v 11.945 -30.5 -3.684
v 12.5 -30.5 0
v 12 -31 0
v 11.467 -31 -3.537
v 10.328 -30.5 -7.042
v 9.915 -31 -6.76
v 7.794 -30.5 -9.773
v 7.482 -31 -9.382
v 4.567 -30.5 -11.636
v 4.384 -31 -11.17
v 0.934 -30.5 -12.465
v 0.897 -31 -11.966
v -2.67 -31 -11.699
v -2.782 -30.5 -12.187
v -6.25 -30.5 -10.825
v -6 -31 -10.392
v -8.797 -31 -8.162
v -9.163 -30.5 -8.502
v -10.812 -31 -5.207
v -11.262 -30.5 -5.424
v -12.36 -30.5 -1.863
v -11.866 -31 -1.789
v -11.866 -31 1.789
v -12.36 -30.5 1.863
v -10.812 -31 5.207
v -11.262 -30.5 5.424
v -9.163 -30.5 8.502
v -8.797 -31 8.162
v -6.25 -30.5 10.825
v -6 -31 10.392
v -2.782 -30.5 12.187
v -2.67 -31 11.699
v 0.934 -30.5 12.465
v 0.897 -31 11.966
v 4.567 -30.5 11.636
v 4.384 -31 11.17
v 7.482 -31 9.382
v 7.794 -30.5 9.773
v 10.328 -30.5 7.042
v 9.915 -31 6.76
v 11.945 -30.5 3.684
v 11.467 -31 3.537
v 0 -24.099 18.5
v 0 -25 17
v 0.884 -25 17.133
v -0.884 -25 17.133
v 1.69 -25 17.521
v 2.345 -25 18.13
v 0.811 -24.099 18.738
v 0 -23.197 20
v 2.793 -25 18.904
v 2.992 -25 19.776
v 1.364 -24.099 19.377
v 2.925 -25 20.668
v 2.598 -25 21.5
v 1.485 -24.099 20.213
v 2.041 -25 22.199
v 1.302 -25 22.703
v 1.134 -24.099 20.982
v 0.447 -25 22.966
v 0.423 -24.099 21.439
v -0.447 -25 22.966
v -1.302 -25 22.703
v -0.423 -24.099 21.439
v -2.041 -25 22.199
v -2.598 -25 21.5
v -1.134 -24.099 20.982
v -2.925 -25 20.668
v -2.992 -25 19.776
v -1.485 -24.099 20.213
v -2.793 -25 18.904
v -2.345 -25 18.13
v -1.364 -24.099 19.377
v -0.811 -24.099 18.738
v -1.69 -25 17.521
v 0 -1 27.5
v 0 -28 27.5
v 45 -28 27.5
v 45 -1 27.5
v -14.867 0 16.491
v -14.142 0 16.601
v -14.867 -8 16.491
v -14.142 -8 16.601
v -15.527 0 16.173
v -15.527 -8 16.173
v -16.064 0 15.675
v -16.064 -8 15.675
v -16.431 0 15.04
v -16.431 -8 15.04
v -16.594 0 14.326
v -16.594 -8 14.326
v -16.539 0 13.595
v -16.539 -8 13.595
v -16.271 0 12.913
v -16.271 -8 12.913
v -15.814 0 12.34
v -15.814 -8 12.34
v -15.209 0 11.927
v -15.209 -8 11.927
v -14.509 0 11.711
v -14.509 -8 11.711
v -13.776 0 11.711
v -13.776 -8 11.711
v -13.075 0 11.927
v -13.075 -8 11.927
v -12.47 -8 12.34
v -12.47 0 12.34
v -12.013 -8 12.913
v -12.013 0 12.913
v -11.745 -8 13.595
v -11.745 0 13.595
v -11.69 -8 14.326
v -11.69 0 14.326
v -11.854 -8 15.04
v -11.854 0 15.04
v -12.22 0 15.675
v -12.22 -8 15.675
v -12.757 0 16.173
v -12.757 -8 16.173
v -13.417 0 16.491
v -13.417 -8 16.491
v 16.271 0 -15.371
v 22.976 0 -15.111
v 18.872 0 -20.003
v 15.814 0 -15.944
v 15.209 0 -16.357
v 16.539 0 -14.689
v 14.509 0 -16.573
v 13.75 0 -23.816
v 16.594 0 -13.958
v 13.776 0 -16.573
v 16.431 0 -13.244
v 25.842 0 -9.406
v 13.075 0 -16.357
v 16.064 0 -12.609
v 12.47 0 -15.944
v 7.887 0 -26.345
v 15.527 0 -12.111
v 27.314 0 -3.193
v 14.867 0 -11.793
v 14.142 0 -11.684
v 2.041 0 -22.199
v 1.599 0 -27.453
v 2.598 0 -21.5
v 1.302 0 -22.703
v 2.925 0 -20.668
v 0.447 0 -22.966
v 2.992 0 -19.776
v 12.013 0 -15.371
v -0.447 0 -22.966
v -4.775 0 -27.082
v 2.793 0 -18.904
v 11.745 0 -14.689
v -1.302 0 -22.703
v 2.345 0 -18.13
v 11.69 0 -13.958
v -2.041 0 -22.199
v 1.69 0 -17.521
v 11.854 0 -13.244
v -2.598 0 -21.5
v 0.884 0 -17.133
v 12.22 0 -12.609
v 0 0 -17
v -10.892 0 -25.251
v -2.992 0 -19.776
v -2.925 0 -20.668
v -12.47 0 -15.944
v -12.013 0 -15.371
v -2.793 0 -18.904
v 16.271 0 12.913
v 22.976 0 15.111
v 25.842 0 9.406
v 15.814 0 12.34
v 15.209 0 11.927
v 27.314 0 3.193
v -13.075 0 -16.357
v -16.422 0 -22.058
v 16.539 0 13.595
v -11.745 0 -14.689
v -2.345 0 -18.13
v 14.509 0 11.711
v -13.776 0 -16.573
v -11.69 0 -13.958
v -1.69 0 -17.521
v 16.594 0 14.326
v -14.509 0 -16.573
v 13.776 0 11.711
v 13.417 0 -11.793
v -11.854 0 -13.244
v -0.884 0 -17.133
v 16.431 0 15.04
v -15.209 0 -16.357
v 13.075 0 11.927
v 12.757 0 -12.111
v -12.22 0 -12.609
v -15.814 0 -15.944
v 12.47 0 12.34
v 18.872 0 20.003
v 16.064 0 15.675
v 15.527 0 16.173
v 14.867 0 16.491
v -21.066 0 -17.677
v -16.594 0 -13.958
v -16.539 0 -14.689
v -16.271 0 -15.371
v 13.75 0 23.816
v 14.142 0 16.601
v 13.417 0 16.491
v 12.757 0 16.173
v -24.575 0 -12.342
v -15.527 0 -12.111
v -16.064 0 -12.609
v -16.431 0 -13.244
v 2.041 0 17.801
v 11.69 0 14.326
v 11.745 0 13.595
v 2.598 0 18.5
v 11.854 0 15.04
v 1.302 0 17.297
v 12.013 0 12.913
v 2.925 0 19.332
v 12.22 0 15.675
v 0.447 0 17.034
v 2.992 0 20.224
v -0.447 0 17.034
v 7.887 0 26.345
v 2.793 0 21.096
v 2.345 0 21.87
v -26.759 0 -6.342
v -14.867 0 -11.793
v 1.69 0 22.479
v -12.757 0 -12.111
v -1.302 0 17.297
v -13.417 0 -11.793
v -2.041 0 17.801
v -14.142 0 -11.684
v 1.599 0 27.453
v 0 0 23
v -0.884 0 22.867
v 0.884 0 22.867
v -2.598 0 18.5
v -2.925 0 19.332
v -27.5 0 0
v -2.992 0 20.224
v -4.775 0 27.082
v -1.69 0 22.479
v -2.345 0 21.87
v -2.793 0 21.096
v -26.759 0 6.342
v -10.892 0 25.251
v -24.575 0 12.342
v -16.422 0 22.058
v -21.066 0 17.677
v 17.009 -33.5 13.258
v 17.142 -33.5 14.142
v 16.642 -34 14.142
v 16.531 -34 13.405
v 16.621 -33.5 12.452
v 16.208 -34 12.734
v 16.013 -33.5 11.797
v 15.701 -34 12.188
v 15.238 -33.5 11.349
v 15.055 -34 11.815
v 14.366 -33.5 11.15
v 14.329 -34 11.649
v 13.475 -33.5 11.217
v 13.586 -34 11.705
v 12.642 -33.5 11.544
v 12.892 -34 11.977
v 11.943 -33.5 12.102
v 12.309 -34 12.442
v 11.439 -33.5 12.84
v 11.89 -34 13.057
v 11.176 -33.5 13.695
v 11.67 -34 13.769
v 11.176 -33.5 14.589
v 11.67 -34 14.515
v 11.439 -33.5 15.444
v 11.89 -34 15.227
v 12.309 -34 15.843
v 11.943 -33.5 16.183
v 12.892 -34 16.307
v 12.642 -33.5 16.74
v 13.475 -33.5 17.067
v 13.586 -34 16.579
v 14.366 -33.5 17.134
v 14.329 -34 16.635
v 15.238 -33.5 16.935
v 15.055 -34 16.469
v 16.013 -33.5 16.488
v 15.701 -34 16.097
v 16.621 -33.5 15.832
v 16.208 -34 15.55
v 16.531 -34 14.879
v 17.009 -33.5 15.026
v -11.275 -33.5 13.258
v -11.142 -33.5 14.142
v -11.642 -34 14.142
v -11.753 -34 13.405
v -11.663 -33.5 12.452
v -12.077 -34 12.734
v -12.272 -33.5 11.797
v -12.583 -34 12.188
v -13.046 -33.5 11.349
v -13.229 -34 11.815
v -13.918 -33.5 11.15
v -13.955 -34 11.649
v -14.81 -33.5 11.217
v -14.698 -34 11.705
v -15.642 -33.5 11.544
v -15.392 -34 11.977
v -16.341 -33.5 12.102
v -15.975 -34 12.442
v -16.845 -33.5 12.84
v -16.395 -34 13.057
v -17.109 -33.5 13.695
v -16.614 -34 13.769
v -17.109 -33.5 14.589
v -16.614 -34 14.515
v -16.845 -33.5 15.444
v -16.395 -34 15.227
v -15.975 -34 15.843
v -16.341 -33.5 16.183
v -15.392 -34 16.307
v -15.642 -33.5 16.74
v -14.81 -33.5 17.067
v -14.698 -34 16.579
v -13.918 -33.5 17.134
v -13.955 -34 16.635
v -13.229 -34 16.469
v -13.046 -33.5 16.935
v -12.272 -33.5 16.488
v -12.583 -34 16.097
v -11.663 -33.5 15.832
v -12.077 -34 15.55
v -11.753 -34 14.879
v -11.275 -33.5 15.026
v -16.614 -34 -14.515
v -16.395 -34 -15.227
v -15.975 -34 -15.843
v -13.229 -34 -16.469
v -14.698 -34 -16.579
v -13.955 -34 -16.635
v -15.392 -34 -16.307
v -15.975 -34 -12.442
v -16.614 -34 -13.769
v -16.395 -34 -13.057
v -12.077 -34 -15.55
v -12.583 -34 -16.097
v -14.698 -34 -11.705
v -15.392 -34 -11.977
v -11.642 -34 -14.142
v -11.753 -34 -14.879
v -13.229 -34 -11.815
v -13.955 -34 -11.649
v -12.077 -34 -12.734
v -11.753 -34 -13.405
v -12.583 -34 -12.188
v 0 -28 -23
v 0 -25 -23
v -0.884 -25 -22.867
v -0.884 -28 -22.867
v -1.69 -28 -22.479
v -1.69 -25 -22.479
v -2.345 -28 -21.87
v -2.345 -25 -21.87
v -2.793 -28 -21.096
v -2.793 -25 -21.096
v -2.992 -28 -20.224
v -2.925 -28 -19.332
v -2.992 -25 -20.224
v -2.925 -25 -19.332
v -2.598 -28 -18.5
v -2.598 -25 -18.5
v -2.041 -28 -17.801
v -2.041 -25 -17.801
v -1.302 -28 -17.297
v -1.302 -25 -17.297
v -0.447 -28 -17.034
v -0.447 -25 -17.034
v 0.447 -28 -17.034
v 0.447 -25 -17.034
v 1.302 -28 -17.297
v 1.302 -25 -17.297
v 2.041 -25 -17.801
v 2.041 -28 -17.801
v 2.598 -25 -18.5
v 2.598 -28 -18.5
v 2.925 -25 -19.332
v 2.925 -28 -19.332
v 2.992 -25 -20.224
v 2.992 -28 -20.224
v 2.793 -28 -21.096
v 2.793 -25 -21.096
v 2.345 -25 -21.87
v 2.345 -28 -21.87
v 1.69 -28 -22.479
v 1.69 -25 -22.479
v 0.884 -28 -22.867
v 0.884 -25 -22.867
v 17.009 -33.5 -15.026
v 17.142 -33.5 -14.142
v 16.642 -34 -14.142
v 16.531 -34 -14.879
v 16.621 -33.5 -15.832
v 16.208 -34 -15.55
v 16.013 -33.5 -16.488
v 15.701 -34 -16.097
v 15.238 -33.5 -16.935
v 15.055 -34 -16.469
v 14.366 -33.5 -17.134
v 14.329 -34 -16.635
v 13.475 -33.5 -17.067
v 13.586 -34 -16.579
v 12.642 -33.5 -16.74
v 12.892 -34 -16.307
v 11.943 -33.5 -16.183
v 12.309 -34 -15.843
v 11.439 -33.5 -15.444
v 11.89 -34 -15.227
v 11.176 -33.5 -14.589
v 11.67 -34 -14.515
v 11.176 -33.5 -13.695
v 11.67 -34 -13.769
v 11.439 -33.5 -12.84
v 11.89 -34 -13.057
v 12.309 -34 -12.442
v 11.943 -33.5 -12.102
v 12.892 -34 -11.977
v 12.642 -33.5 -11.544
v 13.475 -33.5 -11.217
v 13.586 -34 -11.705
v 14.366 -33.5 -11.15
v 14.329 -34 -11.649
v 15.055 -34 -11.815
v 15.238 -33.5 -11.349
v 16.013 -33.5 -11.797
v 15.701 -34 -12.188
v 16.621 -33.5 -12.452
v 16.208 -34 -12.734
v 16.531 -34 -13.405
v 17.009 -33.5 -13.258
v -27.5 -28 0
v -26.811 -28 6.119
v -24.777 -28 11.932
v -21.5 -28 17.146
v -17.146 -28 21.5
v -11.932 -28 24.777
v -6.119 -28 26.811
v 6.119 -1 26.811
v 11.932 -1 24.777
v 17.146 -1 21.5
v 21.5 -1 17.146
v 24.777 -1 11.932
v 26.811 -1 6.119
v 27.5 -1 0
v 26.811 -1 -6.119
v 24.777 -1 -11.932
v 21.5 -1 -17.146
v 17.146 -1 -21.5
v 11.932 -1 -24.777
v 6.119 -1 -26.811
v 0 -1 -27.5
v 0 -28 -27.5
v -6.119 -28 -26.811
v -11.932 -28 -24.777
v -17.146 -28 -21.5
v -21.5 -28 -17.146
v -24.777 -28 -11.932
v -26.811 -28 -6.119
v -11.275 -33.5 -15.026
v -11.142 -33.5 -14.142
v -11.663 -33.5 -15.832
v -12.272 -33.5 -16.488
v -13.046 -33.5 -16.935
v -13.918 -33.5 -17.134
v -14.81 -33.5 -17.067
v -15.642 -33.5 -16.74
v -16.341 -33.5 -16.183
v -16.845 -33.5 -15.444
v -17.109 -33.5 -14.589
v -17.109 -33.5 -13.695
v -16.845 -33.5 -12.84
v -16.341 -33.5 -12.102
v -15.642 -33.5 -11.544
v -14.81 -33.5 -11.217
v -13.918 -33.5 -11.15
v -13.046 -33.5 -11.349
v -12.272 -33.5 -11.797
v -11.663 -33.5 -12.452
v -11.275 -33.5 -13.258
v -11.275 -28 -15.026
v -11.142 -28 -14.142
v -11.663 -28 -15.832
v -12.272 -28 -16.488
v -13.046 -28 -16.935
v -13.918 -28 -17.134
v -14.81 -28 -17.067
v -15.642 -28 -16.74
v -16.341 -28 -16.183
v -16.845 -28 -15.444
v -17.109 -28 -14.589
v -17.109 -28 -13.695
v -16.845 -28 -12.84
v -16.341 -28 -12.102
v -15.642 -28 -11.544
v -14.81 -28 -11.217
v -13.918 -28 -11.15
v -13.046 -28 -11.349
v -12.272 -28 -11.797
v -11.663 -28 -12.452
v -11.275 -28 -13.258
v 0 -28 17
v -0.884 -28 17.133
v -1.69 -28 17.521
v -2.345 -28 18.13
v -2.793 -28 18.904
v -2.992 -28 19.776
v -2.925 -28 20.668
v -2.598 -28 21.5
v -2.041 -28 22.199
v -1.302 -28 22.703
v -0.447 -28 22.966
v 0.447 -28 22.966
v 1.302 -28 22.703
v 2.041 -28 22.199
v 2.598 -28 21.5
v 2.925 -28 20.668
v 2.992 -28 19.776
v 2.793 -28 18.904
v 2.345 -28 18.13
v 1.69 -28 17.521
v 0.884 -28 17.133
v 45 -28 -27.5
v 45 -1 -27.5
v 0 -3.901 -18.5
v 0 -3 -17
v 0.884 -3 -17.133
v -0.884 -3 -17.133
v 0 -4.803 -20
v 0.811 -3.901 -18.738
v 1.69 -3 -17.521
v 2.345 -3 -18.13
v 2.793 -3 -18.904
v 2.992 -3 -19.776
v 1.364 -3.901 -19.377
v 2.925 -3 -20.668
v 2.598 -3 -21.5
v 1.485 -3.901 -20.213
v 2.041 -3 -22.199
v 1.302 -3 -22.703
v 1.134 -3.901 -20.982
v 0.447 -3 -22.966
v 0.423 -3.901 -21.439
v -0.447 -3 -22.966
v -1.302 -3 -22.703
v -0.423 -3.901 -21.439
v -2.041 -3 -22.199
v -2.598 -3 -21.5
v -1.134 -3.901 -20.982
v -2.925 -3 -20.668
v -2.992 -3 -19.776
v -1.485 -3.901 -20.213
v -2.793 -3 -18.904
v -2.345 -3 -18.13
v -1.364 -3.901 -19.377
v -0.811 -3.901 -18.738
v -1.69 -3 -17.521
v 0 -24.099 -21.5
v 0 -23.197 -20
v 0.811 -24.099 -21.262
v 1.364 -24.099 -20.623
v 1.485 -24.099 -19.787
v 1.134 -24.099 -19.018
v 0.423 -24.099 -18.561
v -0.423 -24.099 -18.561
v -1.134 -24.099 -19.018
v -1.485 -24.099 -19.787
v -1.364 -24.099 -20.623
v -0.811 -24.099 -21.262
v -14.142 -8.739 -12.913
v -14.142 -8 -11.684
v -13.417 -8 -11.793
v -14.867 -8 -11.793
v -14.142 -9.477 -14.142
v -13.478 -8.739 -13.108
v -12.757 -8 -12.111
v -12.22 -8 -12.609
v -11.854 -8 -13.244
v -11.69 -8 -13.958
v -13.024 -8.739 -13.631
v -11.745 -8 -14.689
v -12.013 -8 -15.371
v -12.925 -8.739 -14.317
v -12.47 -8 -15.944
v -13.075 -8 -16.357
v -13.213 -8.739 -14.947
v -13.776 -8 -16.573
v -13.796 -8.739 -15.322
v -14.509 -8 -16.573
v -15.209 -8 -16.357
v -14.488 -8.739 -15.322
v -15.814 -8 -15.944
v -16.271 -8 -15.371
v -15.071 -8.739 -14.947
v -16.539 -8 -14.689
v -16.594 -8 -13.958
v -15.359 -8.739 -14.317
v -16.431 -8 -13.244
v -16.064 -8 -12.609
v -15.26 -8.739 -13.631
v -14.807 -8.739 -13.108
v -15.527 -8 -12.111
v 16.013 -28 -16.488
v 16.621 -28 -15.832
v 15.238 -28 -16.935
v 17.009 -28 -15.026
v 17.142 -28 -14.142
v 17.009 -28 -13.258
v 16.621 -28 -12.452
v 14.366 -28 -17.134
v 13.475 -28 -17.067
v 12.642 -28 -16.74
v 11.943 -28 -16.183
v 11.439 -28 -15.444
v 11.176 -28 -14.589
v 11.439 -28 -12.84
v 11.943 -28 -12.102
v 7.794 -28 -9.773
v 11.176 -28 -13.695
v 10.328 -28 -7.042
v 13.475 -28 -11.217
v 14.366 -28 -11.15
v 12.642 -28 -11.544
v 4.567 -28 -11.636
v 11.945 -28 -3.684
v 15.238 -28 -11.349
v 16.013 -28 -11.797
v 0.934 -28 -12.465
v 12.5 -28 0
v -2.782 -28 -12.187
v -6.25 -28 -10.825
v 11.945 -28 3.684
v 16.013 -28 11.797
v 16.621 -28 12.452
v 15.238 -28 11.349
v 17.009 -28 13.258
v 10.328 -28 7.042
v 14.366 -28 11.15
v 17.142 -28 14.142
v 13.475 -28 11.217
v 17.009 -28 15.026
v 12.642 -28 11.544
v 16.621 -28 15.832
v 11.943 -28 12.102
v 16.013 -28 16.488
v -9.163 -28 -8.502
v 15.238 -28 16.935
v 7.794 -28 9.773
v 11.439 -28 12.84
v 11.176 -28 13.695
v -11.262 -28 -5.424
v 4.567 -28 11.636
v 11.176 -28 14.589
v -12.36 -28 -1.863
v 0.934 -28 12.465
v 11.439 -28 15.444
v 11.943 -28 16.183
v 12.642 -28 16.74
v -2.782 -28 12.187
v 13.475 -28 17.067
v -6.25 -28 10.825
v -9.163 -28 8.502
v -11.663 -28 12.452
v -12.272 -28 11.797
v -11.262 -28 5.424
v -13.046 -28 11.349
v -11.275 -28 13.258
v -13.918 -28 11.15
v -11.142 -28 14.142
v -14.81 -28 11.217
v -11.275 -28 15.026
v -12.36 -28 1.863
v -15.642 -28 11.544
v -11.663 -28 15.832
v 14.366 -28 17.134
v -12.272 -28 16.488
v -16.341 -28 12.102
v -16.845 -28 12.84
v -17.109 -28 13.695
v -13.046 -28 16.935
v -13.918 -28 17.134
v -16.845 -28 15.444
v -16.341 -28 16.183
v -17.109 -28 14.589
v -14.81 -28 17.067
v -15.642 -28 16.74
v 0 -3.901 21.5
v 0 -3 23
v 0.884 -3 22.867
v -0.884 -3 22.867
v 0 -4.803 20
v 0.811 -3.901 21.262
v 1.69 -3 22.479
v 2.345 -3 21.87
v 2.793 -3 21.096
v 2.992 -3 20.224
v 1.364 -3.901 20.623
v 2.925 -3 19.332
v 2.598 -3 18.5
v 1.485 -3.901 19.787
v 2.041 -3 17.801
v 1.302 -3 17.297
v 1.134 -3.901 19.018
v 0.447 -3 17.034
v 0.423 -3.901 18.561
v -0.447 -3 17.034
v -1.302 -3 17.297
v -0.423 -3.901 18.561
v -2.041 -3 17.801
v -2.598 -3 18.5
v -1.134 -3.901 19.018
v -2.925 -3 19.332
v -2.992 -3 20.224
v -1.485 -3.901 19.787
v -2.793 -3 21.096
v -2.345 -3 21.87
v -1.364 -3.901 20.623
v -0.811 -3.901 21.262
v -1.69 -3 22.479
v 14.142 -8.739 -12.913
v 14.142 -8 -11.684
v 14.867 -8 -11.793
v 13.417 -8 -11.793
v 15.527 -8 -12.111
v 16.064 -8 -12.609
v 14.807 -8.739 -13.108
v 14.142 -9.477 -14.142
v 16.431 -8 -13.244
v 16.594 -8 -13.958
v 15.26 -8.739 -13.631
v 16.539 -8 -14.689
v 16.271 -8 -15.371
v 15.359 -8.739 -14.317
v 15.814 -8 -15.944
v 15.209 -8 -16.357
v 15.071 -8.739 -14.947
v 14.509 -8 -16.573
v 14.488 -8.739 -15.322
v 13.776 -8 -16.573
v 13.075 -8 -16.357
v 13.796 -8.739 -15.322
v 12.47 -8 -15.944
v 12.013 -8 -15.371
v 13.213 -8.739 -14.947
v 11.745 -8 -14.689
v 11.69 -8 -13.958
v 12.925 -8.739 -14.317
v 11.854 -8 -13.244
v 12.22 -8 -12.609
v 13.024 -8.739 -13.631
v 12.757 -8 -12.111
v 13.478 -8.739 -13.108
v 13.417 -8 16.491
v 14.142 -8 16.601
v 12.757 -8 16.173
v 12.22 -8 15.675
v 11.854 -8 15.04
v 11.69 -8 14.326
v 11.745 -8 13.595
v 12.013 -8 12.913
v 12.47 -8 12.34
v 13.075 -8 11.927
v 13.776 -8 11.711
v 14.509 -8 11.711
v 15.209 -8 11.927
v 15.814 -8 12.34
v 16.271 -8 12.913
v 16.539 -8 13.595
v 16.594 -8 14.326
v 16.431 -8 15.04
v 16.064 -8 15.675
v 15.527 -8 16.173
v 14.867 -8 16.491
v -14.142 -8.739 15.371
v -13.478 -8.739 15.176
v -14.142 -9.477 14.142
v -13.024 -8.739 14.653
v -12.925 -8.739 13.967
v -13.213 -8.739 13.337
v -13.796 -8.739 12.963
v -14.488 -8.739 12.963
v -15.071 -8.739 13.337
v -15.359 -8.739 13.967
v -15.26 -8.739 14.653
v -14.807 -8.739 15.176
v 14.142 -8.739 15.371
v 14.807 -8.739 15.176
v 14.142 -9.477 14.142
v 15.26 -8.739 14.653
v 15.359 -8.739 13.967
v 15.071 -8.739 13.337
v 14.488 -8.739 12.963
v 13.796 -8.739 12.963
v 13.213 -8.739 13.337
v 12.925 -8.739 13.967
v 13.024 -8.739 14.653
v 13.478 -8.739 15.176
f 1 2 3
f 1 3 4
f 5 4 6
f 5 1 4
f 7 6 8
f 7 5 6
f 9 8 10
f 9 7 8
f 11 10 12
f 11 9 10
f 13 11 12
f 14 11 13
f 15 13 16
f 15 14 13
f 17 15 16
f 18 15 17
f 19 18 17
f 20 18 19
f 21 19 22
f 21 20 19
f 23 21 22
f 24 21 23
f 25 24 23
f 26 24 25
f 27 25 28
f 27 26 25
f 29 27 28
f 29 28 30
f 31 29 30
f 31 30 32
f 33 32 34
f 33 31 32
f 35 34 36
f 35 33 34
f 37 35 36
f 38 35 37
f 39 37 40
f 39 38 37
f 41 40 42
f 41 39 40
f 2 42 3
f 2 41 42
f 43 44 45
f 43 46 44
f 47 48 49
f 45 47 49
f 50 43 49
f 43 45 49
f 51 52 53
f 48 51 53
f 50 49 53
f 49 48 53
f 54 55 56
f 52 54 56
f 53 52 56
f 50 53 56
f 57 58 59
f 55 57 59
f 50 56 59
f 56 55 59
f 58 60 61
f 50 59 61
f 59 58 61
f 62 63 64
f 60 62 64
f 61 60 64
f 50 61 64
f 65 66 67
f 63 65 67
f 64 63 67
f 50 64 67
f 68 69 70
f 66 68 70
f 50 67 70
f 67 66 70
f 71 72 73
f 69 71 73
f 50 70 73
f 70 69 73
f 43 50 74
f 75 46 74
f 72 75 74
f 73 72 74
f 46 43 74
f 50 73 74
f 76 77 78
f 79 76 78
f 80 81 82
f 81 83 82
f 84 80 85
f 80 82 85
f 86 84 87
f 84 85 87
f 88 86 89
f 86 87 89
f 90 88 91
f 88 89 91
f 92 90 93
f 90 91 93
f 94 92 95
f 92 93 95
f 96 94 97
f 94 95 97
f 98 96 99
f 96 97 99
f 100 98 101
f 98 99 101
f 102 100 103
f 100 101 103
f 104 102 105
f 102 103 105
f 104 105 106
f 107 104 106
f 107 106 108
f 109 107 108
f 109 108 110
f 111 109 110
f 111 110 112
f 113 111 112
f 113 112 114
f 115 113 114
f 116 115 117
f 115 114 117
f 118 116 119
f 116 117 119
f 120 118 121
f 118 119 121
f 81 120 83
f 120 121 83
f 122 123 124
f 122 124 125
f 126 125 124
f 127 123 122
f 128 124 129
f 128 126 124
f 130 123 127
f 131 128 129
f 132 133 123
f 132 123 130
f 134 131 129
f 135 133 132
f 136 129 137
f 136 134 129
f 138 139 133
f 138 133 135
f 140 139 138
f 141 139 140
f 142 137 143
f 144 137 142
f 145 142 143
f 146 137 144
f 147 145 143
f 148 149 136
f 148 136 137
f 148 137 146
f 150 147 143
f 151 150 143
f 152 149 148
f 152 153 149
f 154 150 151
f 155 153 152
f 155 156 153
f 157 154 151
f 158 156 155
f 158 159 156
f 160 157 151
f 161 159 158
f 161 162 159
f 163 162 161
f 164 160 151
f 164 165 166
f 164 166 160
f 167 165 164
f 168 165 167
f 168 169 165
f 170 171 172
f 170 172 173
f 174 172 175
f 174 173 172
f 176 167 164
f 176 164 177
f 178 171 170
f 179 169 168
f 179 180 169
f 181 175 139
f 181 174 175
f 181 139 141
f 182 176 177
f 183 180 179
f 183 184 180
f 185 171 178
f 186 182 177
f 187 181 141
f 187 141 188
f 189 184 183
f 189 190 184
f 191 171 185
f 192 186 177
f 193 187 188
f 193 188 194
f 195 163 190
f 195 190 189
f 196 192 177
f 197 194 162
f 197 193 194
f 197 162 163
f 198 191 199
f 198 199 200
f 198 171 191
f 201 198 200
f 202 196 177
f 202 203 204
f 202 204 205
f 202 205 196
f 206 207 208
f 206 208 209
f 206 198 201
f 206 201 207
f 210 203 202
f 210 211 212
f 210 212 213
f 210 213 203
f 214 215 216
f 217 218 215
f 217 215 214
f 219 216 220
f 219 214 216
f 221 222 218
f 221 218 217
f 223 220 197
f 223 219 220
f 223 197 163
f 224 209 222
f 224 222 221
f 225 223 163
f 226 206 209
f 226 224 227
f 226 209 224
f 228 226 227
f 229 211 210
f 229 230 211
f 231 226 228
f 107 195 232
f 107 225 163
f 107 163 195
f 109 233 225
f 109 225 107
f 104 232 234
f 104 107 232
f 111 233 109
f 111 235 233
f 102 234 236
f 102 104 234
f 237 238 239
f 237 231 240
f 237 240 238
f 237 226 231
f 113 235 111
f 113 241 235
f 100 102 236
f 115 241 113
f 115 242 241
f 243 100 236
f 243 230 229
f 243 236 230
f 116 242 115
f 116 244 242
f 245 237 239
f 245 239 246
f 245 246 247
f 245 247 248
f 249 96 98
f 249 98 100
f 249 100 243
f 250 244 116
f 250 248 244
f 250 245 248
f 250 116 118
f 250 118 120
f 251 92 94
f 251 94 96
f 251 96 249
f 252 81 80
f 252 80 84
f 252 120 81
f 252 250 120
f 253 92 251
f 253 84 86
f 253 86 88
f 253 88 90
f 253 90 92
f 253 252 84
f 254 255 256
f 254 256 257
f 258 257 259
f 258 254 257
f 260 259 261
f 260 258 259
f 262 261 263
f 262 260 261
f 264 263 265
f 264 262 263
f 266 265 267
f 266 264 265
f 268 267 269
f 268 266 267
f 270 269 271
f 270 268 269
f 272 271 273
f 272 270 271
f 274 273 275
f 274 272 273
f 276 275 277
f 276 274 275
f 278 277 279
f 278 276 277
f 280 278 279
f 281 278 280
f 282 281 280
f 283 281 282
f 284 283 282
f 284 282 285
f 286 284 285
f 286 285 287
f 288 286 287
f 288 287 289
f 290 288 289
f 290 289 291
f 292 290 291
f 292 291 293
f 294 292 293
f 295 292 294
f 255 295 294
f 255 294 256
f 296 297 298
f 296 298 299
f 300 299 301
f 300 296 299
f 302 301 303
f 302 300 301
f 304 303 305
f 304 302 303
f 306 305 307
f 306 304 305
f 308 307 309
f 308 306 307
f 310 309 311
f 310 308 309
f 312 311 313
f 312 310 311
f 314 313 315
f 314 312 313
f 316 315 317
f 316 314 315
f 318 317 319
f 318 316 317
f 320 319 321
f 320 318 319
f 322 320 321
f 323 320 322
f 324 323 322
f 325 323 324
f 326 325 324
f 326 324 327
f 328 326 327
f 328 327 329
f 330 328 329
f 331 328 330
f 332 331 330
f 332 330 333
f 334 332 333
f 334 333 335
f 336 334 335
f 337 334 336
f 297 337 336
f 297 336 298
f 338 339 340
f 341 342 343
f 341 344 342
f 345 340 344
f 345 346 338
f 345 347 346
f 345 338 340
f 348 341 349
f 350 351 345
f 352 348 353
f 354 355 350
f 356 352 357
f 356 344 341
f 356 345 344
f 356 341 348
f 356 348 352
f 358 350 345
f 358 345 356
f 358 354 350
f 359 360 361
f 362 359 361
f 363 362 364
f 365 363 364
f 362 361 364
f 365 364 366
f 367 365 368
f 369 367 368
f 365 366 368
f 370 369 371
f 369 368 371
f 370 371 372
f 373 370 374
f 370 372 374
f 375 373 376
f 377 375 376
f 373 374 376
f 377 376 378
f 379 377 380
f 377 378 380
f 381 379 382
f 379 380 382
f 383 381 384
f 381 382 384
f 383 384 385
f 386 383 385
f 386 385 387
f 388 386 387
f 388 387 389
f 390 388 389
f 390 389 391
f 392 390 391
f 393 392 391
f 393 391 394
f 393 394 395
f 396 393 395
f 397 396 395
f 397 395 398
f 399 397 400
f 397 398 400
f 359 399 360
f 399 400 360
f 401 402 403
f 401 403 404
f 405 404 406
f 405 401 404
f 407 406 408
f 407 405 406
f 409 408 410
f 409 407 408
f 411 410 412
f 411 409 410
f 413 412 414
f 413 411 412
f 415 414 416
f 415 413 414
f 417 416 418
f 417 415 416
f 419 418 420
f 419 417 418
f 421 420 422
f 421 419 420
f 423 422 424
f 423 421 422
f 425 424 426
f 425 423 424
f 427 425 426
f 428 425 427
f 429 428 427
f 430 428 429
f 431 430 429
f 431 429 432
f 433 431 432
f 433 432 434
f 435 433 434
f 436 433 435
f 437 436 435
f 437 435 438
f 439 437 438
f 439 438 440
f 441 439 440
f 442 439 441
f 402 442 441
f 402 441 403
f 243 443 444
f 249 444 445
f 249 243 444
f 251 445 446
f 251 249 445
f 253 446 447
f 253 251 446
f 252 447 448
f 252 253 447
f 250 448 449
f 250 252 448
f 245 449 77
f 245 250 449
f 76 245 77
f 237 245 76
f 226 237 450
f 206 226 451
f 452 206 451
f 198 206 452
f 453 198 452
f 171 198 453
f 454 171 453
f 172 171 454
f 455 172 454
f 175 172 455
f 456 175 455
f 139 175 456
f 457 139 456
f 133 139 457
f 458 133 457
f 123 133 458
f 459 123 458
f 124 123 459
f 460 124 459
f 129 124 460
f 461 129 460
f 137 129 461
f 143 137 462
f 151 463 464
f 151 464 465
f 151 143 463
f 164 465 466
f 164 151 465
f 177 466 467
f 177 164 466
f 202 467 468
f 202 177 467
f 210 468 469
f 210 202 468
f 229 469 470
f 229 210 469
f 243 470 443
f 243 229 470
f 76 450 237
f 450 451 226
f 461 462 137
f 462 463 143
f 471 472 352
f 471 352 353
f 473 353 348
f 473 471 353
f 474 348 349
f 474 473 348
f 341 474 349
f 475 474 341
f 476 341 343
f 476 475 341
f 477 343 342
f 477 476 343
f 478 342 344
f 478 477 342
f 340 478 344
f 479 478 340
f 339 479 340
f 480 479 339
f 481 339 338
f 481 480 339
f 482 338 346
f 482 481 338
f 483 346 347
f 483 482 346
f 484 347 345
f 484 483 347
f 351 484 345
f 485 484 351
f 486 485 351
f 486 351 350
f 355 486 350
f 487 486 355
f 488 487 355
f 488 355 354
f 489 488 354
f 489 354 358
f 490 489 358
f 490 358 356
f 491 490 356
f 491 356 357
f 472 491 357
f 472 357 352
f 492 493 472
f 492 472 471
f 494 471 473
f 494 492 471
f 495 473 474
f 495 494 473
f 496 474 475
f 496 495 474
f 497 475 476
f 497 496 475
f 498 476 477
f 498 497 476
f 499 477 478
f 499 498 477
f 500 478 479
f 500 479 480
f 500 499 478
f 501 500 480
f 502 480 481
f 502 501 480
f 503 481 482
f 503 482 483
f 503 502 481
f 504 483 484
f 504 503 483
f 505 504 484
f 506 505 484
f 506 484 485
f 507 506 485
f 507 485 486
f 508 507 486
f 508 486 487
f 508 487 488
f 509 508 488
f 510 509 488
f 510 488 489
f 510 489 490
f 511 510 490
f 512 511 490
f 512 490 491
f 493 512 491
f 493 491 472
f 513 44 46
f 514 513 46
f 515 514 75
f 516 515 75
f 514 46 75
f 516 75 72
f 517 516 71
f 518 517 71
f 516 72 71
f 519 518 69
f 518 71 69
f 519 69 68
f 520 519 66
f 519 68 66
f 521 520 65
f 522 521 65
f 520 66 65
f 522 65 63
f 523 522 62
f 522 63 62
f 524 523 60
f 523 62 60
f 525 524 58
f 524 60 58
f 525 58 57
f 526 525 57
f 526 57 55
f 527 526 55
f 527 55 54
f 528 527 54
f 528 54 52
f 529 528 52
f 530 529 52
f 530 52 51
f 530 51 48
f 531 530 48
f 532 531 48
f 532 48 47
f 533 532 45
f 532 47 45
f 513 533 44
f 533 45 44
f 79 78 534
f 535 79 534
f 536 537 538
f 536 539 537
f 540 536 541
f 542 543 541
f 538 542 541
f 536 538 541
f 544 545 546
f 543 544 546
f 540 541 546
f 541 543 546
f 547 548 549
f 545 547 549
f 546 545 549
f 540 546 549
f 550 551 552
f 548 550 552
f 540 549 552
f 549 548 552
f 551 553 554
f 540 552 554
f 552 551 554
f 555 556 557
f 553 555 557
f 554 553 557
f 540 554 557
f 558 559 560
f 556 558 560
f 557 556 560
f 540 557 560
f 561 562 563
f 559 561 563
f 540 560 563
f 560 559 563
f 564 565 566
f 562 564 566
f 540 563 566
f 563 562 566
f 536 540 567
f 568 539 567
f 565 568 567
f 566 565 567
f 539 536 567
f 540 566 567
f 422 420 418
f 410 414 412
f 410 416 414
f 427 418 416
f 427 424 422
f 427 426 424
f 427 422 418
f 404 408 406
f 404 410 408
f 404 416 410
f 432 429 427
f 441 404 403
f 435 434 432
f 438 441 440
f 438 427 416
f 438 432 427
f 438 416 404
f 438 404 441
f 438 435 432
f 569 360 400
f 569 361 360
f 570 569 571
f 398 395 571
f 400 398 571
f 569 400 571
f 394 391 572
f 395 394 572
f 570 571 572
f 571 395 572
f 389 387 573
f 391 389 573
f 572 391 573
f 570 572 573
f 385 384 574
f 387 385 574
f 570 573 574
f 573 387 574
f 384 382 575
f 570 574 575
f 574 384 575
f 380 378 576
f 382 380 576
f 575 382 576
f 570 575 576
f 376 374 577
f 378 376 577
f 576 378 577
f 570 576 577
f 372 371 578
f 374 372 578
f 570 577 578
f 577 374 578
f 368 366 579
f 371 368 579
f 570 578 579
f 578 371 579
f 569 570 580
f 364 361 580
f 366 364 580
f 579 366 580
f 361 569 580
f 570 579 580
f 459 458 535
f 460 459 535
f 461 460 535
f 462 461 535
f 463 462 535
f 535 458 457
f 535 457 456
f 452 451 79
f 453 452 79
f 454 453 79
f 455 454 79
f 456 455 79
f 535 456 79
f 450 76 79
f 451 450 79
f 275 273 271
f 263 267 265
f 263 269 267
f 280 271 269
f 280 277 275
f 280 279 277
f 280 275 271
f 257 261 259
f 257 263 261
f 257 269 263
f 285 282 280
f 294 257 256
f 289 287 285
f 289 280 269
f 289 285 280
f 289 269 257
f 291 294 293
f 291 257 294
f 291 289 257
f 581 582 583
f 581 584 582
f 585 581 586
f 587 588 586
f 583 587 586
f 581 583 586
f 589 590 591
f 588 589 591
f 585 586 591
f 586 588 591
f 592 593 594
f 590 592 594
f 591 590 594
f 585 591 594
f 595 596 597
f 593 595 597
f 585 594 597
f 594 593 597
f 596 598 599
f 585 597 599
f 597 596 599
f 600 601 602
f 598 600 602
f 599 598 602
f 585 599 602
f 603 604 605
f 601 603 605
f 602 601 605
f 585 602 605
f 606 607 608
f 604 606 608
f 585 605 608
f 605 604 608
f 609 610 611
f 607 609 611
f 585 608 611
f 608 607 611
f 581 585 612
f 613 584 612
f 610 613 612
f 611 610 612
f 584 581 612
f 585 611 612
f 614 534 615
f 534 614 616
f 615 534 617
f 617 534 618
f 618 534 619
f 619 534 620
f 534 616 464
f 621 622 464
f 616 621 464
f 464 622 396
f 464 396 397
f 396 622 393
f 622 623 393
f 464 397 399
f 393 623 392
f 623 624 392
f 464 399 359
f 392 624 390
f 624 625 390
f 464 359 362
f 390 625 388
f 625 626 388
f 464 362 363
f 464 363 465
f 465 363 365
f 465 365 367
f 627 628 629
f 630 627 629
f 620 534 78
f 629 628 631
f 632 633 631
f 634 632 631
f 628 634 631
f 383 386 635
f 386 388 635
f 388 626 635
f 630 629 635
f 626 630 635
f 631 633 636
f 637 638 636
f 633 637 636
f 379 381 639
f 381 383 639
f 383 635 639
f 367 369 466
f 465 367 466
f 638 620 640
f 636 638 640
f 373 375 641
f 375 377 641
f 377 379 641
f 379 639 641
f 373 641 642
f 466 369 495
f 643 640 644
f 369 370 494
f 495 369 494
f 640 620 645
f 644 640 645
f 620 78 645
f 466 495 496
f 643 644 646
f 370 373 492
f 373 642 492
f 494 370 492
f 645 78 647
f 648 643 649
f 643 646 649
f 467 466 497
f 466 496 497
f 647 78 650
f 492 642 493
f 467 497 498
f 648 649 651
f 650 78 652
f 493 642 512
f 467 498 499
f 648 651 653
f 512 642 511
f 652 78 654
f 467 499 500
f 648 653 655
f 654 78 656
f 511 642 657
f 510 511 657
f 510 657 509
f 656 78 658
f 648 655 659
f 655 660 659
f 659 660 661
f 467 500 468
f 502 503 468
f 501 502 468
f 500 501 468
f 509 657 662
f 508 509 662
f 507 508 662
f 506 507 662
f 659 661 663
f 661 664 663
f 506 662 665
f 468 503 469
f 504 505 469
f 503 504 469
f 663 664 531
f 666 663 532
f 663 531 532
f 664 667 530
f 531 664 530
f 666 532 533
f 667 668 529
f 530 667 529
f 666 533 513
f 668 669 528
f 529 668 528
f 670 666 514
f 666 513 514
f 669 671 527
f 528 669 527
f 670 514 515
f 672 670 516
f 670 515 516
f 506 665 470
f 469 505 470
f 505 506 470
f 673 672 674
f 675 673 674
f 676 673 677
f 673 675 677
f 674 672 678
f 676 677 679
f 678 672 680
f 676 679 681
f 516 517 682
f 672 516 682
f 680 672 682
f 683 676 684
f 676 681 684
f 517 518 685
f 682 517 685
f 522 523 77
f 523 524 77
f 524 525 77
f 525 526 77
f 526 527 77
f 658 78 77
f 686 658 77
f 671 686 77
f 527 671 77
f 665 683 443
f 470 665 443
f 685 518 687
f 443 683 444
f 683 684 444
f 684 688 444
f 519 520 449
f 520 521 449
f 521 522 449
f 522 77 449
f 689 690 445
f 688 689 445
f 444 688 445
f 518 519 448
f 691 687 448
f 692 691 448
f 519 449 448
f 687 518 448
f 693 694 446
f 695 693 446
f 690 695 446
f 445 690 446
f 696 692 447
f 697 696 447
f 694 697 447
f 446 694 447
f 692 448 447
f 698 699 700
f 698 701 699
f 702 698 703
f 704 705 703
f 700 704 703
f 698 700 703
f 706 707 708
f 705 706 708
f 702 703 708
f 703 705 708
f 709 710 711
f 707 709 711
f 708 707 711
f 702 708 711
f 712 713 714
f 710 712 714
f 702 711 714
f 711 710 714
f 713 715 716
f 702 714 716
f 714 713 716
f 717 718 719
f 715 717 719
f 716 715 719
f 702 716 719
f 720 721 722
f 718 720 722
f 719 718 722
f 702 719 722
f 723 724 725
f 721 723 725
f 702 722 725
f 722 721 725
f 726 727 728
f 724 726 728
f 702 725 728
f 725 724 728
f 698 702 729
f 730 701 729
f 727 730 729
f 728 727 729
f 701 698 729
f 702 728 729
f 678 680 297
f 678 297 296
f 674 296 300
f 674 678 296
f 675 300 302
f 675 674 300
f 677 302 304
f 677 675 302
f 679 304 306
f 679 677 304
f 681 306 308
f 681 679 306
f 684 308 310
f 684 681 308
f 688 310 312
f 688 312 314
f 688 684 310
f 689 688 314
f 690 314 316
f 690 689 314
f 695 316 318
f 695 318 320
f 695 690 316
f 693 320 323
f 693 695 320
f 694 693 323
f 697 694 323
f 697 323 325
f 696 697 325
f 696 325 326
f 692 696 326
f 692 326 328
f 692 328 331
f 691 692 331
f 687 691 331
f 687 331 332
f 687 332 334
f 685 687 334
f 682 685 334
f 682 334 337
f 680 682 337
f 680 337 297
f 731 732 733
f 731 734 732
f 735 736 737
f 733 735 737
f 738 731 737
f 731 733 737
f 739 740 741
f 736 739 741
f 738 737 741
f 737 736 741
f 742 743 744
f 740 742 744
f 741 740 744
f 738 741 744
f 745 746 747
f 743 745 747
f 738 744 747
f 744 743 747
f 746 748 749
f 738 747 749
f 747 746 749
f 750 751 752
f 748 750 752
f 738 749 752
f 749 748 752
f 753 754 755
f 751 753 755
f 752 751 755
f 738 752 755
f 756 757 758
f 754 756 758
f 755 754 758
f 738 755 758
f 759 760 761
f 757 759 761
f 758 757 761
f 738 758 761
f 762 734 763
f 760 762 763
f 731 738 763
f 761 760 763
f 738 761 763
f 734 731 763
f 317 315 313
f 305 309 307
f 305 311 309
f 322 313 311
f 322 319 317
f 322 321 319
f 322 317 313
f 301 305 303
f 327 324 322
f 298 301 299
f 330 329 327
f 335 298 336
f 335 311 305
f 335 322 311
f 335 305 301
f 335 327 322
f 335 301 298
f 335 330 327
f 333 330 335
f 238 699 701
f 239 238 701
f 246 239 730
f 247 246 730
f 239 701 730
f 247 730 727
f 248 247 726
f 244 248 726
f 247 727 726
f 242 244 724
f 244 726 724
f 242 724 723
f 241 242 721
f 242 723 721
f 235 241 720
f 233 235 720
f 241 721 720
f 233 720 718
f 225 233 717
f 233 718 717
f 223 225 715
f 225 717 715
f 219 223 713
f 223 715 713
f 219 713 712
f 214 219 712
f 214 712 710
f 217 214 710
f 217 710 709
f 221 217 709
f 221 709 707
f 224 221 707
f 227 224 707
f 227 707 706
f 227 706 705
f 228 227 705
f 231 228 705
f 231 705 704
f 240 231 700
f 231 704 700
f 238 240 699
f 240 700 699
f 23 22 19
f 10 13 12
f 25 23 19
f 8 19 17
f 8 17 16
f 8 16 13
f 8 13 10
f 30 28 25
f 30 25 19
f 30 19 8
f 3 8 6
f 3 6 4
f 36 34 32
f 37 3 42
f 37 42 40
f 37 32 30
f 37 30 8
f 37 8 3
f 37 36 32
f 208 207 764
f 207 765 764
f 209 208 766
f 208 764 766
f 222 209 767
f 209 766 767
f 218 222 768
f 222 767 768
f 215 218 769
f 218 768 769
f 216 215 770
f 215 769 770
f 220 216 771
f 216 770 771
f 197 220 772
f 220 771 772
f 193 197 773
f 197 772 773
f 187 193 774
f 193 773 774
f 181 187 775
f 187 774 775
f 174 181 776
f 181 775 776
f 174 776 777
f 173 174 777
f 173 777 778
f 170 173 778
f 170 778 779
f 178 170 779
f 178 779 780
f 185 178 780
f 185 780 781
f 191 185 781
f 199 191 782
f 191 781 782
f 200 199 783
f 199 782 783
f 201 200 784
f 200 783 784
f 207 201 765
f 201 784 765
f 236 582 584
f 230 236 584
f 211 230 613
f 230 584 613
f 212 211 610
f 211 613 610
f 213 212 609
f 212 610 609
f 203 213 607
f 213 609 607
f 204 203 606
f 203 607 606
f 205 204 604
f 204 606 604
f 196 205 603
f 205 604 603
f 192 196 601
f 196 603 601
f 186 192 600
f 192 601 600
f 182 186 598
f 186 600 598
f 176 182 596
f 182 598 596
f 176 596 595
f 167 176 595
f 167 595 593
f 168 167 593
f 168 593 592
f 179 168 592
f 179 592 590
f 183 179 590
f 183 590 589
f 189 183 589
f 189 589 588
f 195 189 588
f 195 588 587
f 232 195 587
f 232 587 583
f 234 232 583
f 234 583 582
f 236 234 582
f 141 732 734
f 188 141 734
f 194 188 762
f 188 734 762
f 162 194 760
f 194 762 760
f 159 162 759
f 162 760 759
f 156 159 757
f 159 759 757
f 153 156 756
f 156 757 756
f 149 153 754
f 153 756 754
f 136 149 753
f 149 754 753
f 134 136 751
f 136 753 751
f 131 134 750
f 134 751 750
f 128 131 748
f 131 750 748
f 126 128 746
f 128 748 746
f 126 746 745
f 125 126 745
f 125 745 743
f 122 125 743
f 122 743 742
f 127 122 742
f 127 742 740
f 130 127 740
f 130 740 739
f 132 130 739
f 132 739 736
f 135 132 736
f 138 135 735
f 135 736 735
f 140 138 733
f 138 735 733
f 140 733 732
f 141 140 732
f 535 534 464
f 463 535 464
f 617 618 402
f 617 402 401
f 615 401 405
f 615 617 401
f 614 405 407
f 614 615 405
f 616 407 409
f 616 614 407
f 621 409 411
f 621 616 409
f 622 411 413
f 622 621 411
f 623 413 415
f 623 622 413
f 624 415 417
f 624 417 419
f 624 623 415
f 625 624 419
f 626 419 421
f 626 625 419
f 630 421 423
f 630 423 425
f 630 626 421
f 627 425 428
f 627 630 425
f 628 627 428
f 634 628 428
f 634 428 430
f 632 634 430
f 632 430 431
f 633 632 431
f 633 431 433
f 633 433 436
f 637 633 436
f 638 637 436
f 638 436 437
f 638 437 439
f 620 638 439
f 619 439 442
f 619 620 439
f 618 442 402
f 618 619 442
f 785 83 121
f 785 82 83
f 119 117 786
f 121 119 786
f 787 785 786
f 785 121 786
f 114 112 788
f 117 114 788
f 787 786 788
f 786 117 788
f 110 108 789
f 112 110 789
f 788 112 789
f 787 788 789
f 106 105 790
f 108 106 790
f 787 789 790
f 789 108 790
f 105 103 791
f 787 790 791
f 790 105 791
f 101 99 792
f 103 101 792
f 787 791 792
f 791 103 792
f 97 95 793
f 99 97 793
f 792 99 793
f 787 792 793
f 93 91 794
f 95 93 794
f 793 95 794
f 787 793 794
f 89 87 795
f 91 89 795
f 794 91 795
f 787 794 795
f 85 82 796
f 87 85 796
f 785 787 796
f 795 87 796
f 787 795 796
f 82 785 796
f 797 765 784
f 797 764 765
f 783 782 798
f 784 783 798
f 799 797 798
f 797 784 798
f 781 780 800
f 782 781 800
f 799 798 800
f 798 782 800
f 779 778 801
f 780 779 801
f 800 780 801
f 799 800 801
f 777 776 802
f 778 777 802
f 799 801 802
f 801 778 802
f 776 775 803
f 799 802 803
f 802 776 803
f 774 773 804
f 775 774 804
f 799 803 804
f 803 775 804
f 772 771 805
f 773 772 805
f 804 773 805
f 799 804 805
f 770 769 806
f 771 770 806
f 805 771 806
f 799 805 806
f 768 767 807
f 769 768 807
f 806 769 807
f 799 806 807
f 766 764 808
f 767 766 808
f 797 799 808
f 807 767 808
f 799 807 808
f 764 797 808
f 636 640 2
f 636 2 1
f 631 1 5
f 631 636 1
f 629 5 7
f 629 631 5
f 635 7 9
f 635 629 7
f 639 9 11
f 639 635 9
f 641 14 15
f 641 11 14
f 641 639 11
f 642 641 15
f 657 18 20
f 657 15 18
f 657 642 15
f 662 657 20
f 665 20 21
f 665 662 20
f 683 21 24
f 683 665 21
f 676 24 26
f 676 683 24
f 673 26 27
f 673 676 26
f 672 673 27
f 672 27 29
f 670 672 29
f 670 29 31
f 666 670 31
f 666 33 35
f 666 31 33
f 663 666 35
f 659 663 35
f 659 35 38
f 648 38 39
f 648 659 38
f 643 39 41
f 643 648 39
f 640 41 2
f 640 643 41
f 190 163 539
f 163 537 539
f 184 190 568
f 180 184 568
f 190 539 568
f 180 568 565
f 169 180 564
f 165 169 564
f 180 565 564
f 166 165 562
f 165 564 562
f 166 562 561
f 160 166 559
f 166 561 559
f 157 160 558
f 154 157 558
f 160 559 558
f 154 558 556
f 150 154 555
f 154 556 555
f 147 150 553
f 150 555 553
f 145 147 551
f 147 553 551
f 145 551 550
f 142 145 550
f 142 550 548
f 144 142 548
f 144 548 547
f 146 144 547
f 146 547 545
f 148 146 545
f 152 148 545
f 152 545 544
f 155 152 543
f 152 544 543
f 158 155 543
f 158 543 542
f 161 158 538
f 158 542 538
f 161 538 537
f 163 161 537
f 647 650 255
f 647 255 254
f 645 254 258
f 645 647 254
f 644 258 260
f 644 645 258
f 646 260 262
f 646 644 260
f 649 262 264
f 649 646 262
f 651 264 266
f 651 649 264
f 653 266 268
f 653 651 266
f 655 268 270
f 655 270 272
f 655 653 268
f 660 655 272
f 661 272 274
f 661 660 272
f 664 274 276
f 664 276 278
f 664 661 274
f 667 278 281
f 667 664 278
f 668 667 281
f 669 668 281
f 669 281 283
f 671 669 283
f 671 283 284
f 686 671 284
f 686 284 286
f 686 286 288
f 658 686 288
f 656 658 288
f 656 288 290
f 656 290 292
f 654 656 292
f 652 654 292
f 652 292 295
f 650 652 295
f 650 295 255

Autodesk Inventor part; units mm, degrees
ref_plane "YZ Plane" through (0, 0, 0) normal (1, 0, 0) x (0, 1, 0)
ref_plane "XZ Plane" through (0, 0, 0) normal (0, 1, 0) x (-1, 0, 0)
ref_plane "XY Plane" through (0, 0, 0) normal (0, 0, 1) x (1, 0, 0)
sketch "Sketch1" plane through (0, 0, 0) normal (0, 1, 0) x (-1, 0, 0)
  circle A0 centre (0, 0) radius 27.5
  point P0 (20, 0)
  point P1 (14.1421, 14.1421)
  point P2 (0, 20)
  point P3 (-14.1421, 14.1421)
  point P4 (-20, 0)
  point P5 (-14.1421, -14.1421)
  point P6 (0, -20)
  point P7 (14.1421, -14.1421)
  dimension "d0" = 55
  dimension "d19" = 20
  dimension "d22" = 360
extrude "Extrusion1" add sketch "Sketch1" against normal blind 28
sketch "Sketch2" plane through (0, -28, 0) normal (0, -1, 0) x (1, 0, 0)
  circle A0 centre (0, 0) radius 27.5 projected
  line L0 (0, 27.5) -> (45, 27.5)
  line L1 (45, 27.5) -> (45, -27.5)
  line L2 (45, -27.5) -> (0, -27.5)
  dimension "d15" = 45
  dimension "d16" = 55
extrude "Extrusion2" add sketch "Sketch2" against normal blind 27 contours A0 L0 L1 L2
hole "Hole1" at (0, 0, 20) at (0, 0, -20) direction (0, -1, 0) diameter 6 depth 3 tip angle 118
hole "Hole2" at (-14.1421, 0, 14.1421) at (14.1421, 0, 14.1421) at (14.1421, 0, -14.1421) at (-14.1421, 0, -14.1421) direction (0, -1, 0) diameter 4.917 depth 8 tip angle 118 thread size "M6x1" class "6H" standard "ANSI Metric M Profile"
sketch "Sketch3" plane through (0, -28, 0) normal (0, -1, 0) x (1, 0, 0)
  arc A0 (0, 27.5) -> (0, -27.5) centre (0, 0) ccw projected
  circle A1 centre (0, 0) radius 12.5
  circle A2 centre (0, 0) radius 20
  circle A3 centre (20, 0) radius 3
  circle A4 centre (14.1421, 14.1421) radius 3
  circle A5 centre (0, 20) radius 3
  circle A6 centre (-14.1421, 14.1421) radius 3
  circle A7 centre (-20, 0) radius 3
  circle A8 centre (-14.1421, -14.1421) radius 3
  circle A9 centre (0, -20) radius 3
  circle A10 centre (14.1421, -14.1421) radius 3
  dimension "d44" = 40
  dimension "d38" = 25
  dimension "d45" = 6
  dimension "d48" = 360
extrude "Extrusion3" add sketch "Sketch3" along normal blind 3 contours A1
chamfer "Chamfer1" distance 0.5 angle 45 1 edges at (-12.5, -31, 0)
extrude "Extrusion4" add sketch "Sketch3" along normal blind 6 contours A4 A2 | A2 A4 | A10 A2 | A2 A10 | A6 A2 | A2 A6 | A8 A2 | A2 A8
thread "Thread1" size "M6x1" class "6g" standard "ANSI Metric M Profile" full length
thread "Thread2" size "M6x1" class "6g" standard "ANSI Metric M Profile" full length
thread "Thread3" size "M6x1" class "6g" standard "ANSI Metric M Profile" full length
thread "Thread4" size "M6x1" class "6g" standard "ANSI Metric M Profile" full length
chamfer "Chamfer2" distance 0.5 angle 45 1 edges at (-17.1421, -34, -14.1421)
chamfer "Chamfer3" distance 0.5 angle 45 1 edges at (-17.1421, -34, 14.1421)
chamfer "Chamfer4" distance 0.5 angle 45 1 edges at (11.1421, -34, 14.1421)
chamfer "Chamfer5" distance 0.5 angle 45 1 edges at (11.1421, -34, -14.1421)
hole "Hole3" at (0, -28, 20) at (0, -28, -20) direction (0, 1, 0) diameter 6 depth 3 tip angle 118
properties part number "CFS055CA501U"
